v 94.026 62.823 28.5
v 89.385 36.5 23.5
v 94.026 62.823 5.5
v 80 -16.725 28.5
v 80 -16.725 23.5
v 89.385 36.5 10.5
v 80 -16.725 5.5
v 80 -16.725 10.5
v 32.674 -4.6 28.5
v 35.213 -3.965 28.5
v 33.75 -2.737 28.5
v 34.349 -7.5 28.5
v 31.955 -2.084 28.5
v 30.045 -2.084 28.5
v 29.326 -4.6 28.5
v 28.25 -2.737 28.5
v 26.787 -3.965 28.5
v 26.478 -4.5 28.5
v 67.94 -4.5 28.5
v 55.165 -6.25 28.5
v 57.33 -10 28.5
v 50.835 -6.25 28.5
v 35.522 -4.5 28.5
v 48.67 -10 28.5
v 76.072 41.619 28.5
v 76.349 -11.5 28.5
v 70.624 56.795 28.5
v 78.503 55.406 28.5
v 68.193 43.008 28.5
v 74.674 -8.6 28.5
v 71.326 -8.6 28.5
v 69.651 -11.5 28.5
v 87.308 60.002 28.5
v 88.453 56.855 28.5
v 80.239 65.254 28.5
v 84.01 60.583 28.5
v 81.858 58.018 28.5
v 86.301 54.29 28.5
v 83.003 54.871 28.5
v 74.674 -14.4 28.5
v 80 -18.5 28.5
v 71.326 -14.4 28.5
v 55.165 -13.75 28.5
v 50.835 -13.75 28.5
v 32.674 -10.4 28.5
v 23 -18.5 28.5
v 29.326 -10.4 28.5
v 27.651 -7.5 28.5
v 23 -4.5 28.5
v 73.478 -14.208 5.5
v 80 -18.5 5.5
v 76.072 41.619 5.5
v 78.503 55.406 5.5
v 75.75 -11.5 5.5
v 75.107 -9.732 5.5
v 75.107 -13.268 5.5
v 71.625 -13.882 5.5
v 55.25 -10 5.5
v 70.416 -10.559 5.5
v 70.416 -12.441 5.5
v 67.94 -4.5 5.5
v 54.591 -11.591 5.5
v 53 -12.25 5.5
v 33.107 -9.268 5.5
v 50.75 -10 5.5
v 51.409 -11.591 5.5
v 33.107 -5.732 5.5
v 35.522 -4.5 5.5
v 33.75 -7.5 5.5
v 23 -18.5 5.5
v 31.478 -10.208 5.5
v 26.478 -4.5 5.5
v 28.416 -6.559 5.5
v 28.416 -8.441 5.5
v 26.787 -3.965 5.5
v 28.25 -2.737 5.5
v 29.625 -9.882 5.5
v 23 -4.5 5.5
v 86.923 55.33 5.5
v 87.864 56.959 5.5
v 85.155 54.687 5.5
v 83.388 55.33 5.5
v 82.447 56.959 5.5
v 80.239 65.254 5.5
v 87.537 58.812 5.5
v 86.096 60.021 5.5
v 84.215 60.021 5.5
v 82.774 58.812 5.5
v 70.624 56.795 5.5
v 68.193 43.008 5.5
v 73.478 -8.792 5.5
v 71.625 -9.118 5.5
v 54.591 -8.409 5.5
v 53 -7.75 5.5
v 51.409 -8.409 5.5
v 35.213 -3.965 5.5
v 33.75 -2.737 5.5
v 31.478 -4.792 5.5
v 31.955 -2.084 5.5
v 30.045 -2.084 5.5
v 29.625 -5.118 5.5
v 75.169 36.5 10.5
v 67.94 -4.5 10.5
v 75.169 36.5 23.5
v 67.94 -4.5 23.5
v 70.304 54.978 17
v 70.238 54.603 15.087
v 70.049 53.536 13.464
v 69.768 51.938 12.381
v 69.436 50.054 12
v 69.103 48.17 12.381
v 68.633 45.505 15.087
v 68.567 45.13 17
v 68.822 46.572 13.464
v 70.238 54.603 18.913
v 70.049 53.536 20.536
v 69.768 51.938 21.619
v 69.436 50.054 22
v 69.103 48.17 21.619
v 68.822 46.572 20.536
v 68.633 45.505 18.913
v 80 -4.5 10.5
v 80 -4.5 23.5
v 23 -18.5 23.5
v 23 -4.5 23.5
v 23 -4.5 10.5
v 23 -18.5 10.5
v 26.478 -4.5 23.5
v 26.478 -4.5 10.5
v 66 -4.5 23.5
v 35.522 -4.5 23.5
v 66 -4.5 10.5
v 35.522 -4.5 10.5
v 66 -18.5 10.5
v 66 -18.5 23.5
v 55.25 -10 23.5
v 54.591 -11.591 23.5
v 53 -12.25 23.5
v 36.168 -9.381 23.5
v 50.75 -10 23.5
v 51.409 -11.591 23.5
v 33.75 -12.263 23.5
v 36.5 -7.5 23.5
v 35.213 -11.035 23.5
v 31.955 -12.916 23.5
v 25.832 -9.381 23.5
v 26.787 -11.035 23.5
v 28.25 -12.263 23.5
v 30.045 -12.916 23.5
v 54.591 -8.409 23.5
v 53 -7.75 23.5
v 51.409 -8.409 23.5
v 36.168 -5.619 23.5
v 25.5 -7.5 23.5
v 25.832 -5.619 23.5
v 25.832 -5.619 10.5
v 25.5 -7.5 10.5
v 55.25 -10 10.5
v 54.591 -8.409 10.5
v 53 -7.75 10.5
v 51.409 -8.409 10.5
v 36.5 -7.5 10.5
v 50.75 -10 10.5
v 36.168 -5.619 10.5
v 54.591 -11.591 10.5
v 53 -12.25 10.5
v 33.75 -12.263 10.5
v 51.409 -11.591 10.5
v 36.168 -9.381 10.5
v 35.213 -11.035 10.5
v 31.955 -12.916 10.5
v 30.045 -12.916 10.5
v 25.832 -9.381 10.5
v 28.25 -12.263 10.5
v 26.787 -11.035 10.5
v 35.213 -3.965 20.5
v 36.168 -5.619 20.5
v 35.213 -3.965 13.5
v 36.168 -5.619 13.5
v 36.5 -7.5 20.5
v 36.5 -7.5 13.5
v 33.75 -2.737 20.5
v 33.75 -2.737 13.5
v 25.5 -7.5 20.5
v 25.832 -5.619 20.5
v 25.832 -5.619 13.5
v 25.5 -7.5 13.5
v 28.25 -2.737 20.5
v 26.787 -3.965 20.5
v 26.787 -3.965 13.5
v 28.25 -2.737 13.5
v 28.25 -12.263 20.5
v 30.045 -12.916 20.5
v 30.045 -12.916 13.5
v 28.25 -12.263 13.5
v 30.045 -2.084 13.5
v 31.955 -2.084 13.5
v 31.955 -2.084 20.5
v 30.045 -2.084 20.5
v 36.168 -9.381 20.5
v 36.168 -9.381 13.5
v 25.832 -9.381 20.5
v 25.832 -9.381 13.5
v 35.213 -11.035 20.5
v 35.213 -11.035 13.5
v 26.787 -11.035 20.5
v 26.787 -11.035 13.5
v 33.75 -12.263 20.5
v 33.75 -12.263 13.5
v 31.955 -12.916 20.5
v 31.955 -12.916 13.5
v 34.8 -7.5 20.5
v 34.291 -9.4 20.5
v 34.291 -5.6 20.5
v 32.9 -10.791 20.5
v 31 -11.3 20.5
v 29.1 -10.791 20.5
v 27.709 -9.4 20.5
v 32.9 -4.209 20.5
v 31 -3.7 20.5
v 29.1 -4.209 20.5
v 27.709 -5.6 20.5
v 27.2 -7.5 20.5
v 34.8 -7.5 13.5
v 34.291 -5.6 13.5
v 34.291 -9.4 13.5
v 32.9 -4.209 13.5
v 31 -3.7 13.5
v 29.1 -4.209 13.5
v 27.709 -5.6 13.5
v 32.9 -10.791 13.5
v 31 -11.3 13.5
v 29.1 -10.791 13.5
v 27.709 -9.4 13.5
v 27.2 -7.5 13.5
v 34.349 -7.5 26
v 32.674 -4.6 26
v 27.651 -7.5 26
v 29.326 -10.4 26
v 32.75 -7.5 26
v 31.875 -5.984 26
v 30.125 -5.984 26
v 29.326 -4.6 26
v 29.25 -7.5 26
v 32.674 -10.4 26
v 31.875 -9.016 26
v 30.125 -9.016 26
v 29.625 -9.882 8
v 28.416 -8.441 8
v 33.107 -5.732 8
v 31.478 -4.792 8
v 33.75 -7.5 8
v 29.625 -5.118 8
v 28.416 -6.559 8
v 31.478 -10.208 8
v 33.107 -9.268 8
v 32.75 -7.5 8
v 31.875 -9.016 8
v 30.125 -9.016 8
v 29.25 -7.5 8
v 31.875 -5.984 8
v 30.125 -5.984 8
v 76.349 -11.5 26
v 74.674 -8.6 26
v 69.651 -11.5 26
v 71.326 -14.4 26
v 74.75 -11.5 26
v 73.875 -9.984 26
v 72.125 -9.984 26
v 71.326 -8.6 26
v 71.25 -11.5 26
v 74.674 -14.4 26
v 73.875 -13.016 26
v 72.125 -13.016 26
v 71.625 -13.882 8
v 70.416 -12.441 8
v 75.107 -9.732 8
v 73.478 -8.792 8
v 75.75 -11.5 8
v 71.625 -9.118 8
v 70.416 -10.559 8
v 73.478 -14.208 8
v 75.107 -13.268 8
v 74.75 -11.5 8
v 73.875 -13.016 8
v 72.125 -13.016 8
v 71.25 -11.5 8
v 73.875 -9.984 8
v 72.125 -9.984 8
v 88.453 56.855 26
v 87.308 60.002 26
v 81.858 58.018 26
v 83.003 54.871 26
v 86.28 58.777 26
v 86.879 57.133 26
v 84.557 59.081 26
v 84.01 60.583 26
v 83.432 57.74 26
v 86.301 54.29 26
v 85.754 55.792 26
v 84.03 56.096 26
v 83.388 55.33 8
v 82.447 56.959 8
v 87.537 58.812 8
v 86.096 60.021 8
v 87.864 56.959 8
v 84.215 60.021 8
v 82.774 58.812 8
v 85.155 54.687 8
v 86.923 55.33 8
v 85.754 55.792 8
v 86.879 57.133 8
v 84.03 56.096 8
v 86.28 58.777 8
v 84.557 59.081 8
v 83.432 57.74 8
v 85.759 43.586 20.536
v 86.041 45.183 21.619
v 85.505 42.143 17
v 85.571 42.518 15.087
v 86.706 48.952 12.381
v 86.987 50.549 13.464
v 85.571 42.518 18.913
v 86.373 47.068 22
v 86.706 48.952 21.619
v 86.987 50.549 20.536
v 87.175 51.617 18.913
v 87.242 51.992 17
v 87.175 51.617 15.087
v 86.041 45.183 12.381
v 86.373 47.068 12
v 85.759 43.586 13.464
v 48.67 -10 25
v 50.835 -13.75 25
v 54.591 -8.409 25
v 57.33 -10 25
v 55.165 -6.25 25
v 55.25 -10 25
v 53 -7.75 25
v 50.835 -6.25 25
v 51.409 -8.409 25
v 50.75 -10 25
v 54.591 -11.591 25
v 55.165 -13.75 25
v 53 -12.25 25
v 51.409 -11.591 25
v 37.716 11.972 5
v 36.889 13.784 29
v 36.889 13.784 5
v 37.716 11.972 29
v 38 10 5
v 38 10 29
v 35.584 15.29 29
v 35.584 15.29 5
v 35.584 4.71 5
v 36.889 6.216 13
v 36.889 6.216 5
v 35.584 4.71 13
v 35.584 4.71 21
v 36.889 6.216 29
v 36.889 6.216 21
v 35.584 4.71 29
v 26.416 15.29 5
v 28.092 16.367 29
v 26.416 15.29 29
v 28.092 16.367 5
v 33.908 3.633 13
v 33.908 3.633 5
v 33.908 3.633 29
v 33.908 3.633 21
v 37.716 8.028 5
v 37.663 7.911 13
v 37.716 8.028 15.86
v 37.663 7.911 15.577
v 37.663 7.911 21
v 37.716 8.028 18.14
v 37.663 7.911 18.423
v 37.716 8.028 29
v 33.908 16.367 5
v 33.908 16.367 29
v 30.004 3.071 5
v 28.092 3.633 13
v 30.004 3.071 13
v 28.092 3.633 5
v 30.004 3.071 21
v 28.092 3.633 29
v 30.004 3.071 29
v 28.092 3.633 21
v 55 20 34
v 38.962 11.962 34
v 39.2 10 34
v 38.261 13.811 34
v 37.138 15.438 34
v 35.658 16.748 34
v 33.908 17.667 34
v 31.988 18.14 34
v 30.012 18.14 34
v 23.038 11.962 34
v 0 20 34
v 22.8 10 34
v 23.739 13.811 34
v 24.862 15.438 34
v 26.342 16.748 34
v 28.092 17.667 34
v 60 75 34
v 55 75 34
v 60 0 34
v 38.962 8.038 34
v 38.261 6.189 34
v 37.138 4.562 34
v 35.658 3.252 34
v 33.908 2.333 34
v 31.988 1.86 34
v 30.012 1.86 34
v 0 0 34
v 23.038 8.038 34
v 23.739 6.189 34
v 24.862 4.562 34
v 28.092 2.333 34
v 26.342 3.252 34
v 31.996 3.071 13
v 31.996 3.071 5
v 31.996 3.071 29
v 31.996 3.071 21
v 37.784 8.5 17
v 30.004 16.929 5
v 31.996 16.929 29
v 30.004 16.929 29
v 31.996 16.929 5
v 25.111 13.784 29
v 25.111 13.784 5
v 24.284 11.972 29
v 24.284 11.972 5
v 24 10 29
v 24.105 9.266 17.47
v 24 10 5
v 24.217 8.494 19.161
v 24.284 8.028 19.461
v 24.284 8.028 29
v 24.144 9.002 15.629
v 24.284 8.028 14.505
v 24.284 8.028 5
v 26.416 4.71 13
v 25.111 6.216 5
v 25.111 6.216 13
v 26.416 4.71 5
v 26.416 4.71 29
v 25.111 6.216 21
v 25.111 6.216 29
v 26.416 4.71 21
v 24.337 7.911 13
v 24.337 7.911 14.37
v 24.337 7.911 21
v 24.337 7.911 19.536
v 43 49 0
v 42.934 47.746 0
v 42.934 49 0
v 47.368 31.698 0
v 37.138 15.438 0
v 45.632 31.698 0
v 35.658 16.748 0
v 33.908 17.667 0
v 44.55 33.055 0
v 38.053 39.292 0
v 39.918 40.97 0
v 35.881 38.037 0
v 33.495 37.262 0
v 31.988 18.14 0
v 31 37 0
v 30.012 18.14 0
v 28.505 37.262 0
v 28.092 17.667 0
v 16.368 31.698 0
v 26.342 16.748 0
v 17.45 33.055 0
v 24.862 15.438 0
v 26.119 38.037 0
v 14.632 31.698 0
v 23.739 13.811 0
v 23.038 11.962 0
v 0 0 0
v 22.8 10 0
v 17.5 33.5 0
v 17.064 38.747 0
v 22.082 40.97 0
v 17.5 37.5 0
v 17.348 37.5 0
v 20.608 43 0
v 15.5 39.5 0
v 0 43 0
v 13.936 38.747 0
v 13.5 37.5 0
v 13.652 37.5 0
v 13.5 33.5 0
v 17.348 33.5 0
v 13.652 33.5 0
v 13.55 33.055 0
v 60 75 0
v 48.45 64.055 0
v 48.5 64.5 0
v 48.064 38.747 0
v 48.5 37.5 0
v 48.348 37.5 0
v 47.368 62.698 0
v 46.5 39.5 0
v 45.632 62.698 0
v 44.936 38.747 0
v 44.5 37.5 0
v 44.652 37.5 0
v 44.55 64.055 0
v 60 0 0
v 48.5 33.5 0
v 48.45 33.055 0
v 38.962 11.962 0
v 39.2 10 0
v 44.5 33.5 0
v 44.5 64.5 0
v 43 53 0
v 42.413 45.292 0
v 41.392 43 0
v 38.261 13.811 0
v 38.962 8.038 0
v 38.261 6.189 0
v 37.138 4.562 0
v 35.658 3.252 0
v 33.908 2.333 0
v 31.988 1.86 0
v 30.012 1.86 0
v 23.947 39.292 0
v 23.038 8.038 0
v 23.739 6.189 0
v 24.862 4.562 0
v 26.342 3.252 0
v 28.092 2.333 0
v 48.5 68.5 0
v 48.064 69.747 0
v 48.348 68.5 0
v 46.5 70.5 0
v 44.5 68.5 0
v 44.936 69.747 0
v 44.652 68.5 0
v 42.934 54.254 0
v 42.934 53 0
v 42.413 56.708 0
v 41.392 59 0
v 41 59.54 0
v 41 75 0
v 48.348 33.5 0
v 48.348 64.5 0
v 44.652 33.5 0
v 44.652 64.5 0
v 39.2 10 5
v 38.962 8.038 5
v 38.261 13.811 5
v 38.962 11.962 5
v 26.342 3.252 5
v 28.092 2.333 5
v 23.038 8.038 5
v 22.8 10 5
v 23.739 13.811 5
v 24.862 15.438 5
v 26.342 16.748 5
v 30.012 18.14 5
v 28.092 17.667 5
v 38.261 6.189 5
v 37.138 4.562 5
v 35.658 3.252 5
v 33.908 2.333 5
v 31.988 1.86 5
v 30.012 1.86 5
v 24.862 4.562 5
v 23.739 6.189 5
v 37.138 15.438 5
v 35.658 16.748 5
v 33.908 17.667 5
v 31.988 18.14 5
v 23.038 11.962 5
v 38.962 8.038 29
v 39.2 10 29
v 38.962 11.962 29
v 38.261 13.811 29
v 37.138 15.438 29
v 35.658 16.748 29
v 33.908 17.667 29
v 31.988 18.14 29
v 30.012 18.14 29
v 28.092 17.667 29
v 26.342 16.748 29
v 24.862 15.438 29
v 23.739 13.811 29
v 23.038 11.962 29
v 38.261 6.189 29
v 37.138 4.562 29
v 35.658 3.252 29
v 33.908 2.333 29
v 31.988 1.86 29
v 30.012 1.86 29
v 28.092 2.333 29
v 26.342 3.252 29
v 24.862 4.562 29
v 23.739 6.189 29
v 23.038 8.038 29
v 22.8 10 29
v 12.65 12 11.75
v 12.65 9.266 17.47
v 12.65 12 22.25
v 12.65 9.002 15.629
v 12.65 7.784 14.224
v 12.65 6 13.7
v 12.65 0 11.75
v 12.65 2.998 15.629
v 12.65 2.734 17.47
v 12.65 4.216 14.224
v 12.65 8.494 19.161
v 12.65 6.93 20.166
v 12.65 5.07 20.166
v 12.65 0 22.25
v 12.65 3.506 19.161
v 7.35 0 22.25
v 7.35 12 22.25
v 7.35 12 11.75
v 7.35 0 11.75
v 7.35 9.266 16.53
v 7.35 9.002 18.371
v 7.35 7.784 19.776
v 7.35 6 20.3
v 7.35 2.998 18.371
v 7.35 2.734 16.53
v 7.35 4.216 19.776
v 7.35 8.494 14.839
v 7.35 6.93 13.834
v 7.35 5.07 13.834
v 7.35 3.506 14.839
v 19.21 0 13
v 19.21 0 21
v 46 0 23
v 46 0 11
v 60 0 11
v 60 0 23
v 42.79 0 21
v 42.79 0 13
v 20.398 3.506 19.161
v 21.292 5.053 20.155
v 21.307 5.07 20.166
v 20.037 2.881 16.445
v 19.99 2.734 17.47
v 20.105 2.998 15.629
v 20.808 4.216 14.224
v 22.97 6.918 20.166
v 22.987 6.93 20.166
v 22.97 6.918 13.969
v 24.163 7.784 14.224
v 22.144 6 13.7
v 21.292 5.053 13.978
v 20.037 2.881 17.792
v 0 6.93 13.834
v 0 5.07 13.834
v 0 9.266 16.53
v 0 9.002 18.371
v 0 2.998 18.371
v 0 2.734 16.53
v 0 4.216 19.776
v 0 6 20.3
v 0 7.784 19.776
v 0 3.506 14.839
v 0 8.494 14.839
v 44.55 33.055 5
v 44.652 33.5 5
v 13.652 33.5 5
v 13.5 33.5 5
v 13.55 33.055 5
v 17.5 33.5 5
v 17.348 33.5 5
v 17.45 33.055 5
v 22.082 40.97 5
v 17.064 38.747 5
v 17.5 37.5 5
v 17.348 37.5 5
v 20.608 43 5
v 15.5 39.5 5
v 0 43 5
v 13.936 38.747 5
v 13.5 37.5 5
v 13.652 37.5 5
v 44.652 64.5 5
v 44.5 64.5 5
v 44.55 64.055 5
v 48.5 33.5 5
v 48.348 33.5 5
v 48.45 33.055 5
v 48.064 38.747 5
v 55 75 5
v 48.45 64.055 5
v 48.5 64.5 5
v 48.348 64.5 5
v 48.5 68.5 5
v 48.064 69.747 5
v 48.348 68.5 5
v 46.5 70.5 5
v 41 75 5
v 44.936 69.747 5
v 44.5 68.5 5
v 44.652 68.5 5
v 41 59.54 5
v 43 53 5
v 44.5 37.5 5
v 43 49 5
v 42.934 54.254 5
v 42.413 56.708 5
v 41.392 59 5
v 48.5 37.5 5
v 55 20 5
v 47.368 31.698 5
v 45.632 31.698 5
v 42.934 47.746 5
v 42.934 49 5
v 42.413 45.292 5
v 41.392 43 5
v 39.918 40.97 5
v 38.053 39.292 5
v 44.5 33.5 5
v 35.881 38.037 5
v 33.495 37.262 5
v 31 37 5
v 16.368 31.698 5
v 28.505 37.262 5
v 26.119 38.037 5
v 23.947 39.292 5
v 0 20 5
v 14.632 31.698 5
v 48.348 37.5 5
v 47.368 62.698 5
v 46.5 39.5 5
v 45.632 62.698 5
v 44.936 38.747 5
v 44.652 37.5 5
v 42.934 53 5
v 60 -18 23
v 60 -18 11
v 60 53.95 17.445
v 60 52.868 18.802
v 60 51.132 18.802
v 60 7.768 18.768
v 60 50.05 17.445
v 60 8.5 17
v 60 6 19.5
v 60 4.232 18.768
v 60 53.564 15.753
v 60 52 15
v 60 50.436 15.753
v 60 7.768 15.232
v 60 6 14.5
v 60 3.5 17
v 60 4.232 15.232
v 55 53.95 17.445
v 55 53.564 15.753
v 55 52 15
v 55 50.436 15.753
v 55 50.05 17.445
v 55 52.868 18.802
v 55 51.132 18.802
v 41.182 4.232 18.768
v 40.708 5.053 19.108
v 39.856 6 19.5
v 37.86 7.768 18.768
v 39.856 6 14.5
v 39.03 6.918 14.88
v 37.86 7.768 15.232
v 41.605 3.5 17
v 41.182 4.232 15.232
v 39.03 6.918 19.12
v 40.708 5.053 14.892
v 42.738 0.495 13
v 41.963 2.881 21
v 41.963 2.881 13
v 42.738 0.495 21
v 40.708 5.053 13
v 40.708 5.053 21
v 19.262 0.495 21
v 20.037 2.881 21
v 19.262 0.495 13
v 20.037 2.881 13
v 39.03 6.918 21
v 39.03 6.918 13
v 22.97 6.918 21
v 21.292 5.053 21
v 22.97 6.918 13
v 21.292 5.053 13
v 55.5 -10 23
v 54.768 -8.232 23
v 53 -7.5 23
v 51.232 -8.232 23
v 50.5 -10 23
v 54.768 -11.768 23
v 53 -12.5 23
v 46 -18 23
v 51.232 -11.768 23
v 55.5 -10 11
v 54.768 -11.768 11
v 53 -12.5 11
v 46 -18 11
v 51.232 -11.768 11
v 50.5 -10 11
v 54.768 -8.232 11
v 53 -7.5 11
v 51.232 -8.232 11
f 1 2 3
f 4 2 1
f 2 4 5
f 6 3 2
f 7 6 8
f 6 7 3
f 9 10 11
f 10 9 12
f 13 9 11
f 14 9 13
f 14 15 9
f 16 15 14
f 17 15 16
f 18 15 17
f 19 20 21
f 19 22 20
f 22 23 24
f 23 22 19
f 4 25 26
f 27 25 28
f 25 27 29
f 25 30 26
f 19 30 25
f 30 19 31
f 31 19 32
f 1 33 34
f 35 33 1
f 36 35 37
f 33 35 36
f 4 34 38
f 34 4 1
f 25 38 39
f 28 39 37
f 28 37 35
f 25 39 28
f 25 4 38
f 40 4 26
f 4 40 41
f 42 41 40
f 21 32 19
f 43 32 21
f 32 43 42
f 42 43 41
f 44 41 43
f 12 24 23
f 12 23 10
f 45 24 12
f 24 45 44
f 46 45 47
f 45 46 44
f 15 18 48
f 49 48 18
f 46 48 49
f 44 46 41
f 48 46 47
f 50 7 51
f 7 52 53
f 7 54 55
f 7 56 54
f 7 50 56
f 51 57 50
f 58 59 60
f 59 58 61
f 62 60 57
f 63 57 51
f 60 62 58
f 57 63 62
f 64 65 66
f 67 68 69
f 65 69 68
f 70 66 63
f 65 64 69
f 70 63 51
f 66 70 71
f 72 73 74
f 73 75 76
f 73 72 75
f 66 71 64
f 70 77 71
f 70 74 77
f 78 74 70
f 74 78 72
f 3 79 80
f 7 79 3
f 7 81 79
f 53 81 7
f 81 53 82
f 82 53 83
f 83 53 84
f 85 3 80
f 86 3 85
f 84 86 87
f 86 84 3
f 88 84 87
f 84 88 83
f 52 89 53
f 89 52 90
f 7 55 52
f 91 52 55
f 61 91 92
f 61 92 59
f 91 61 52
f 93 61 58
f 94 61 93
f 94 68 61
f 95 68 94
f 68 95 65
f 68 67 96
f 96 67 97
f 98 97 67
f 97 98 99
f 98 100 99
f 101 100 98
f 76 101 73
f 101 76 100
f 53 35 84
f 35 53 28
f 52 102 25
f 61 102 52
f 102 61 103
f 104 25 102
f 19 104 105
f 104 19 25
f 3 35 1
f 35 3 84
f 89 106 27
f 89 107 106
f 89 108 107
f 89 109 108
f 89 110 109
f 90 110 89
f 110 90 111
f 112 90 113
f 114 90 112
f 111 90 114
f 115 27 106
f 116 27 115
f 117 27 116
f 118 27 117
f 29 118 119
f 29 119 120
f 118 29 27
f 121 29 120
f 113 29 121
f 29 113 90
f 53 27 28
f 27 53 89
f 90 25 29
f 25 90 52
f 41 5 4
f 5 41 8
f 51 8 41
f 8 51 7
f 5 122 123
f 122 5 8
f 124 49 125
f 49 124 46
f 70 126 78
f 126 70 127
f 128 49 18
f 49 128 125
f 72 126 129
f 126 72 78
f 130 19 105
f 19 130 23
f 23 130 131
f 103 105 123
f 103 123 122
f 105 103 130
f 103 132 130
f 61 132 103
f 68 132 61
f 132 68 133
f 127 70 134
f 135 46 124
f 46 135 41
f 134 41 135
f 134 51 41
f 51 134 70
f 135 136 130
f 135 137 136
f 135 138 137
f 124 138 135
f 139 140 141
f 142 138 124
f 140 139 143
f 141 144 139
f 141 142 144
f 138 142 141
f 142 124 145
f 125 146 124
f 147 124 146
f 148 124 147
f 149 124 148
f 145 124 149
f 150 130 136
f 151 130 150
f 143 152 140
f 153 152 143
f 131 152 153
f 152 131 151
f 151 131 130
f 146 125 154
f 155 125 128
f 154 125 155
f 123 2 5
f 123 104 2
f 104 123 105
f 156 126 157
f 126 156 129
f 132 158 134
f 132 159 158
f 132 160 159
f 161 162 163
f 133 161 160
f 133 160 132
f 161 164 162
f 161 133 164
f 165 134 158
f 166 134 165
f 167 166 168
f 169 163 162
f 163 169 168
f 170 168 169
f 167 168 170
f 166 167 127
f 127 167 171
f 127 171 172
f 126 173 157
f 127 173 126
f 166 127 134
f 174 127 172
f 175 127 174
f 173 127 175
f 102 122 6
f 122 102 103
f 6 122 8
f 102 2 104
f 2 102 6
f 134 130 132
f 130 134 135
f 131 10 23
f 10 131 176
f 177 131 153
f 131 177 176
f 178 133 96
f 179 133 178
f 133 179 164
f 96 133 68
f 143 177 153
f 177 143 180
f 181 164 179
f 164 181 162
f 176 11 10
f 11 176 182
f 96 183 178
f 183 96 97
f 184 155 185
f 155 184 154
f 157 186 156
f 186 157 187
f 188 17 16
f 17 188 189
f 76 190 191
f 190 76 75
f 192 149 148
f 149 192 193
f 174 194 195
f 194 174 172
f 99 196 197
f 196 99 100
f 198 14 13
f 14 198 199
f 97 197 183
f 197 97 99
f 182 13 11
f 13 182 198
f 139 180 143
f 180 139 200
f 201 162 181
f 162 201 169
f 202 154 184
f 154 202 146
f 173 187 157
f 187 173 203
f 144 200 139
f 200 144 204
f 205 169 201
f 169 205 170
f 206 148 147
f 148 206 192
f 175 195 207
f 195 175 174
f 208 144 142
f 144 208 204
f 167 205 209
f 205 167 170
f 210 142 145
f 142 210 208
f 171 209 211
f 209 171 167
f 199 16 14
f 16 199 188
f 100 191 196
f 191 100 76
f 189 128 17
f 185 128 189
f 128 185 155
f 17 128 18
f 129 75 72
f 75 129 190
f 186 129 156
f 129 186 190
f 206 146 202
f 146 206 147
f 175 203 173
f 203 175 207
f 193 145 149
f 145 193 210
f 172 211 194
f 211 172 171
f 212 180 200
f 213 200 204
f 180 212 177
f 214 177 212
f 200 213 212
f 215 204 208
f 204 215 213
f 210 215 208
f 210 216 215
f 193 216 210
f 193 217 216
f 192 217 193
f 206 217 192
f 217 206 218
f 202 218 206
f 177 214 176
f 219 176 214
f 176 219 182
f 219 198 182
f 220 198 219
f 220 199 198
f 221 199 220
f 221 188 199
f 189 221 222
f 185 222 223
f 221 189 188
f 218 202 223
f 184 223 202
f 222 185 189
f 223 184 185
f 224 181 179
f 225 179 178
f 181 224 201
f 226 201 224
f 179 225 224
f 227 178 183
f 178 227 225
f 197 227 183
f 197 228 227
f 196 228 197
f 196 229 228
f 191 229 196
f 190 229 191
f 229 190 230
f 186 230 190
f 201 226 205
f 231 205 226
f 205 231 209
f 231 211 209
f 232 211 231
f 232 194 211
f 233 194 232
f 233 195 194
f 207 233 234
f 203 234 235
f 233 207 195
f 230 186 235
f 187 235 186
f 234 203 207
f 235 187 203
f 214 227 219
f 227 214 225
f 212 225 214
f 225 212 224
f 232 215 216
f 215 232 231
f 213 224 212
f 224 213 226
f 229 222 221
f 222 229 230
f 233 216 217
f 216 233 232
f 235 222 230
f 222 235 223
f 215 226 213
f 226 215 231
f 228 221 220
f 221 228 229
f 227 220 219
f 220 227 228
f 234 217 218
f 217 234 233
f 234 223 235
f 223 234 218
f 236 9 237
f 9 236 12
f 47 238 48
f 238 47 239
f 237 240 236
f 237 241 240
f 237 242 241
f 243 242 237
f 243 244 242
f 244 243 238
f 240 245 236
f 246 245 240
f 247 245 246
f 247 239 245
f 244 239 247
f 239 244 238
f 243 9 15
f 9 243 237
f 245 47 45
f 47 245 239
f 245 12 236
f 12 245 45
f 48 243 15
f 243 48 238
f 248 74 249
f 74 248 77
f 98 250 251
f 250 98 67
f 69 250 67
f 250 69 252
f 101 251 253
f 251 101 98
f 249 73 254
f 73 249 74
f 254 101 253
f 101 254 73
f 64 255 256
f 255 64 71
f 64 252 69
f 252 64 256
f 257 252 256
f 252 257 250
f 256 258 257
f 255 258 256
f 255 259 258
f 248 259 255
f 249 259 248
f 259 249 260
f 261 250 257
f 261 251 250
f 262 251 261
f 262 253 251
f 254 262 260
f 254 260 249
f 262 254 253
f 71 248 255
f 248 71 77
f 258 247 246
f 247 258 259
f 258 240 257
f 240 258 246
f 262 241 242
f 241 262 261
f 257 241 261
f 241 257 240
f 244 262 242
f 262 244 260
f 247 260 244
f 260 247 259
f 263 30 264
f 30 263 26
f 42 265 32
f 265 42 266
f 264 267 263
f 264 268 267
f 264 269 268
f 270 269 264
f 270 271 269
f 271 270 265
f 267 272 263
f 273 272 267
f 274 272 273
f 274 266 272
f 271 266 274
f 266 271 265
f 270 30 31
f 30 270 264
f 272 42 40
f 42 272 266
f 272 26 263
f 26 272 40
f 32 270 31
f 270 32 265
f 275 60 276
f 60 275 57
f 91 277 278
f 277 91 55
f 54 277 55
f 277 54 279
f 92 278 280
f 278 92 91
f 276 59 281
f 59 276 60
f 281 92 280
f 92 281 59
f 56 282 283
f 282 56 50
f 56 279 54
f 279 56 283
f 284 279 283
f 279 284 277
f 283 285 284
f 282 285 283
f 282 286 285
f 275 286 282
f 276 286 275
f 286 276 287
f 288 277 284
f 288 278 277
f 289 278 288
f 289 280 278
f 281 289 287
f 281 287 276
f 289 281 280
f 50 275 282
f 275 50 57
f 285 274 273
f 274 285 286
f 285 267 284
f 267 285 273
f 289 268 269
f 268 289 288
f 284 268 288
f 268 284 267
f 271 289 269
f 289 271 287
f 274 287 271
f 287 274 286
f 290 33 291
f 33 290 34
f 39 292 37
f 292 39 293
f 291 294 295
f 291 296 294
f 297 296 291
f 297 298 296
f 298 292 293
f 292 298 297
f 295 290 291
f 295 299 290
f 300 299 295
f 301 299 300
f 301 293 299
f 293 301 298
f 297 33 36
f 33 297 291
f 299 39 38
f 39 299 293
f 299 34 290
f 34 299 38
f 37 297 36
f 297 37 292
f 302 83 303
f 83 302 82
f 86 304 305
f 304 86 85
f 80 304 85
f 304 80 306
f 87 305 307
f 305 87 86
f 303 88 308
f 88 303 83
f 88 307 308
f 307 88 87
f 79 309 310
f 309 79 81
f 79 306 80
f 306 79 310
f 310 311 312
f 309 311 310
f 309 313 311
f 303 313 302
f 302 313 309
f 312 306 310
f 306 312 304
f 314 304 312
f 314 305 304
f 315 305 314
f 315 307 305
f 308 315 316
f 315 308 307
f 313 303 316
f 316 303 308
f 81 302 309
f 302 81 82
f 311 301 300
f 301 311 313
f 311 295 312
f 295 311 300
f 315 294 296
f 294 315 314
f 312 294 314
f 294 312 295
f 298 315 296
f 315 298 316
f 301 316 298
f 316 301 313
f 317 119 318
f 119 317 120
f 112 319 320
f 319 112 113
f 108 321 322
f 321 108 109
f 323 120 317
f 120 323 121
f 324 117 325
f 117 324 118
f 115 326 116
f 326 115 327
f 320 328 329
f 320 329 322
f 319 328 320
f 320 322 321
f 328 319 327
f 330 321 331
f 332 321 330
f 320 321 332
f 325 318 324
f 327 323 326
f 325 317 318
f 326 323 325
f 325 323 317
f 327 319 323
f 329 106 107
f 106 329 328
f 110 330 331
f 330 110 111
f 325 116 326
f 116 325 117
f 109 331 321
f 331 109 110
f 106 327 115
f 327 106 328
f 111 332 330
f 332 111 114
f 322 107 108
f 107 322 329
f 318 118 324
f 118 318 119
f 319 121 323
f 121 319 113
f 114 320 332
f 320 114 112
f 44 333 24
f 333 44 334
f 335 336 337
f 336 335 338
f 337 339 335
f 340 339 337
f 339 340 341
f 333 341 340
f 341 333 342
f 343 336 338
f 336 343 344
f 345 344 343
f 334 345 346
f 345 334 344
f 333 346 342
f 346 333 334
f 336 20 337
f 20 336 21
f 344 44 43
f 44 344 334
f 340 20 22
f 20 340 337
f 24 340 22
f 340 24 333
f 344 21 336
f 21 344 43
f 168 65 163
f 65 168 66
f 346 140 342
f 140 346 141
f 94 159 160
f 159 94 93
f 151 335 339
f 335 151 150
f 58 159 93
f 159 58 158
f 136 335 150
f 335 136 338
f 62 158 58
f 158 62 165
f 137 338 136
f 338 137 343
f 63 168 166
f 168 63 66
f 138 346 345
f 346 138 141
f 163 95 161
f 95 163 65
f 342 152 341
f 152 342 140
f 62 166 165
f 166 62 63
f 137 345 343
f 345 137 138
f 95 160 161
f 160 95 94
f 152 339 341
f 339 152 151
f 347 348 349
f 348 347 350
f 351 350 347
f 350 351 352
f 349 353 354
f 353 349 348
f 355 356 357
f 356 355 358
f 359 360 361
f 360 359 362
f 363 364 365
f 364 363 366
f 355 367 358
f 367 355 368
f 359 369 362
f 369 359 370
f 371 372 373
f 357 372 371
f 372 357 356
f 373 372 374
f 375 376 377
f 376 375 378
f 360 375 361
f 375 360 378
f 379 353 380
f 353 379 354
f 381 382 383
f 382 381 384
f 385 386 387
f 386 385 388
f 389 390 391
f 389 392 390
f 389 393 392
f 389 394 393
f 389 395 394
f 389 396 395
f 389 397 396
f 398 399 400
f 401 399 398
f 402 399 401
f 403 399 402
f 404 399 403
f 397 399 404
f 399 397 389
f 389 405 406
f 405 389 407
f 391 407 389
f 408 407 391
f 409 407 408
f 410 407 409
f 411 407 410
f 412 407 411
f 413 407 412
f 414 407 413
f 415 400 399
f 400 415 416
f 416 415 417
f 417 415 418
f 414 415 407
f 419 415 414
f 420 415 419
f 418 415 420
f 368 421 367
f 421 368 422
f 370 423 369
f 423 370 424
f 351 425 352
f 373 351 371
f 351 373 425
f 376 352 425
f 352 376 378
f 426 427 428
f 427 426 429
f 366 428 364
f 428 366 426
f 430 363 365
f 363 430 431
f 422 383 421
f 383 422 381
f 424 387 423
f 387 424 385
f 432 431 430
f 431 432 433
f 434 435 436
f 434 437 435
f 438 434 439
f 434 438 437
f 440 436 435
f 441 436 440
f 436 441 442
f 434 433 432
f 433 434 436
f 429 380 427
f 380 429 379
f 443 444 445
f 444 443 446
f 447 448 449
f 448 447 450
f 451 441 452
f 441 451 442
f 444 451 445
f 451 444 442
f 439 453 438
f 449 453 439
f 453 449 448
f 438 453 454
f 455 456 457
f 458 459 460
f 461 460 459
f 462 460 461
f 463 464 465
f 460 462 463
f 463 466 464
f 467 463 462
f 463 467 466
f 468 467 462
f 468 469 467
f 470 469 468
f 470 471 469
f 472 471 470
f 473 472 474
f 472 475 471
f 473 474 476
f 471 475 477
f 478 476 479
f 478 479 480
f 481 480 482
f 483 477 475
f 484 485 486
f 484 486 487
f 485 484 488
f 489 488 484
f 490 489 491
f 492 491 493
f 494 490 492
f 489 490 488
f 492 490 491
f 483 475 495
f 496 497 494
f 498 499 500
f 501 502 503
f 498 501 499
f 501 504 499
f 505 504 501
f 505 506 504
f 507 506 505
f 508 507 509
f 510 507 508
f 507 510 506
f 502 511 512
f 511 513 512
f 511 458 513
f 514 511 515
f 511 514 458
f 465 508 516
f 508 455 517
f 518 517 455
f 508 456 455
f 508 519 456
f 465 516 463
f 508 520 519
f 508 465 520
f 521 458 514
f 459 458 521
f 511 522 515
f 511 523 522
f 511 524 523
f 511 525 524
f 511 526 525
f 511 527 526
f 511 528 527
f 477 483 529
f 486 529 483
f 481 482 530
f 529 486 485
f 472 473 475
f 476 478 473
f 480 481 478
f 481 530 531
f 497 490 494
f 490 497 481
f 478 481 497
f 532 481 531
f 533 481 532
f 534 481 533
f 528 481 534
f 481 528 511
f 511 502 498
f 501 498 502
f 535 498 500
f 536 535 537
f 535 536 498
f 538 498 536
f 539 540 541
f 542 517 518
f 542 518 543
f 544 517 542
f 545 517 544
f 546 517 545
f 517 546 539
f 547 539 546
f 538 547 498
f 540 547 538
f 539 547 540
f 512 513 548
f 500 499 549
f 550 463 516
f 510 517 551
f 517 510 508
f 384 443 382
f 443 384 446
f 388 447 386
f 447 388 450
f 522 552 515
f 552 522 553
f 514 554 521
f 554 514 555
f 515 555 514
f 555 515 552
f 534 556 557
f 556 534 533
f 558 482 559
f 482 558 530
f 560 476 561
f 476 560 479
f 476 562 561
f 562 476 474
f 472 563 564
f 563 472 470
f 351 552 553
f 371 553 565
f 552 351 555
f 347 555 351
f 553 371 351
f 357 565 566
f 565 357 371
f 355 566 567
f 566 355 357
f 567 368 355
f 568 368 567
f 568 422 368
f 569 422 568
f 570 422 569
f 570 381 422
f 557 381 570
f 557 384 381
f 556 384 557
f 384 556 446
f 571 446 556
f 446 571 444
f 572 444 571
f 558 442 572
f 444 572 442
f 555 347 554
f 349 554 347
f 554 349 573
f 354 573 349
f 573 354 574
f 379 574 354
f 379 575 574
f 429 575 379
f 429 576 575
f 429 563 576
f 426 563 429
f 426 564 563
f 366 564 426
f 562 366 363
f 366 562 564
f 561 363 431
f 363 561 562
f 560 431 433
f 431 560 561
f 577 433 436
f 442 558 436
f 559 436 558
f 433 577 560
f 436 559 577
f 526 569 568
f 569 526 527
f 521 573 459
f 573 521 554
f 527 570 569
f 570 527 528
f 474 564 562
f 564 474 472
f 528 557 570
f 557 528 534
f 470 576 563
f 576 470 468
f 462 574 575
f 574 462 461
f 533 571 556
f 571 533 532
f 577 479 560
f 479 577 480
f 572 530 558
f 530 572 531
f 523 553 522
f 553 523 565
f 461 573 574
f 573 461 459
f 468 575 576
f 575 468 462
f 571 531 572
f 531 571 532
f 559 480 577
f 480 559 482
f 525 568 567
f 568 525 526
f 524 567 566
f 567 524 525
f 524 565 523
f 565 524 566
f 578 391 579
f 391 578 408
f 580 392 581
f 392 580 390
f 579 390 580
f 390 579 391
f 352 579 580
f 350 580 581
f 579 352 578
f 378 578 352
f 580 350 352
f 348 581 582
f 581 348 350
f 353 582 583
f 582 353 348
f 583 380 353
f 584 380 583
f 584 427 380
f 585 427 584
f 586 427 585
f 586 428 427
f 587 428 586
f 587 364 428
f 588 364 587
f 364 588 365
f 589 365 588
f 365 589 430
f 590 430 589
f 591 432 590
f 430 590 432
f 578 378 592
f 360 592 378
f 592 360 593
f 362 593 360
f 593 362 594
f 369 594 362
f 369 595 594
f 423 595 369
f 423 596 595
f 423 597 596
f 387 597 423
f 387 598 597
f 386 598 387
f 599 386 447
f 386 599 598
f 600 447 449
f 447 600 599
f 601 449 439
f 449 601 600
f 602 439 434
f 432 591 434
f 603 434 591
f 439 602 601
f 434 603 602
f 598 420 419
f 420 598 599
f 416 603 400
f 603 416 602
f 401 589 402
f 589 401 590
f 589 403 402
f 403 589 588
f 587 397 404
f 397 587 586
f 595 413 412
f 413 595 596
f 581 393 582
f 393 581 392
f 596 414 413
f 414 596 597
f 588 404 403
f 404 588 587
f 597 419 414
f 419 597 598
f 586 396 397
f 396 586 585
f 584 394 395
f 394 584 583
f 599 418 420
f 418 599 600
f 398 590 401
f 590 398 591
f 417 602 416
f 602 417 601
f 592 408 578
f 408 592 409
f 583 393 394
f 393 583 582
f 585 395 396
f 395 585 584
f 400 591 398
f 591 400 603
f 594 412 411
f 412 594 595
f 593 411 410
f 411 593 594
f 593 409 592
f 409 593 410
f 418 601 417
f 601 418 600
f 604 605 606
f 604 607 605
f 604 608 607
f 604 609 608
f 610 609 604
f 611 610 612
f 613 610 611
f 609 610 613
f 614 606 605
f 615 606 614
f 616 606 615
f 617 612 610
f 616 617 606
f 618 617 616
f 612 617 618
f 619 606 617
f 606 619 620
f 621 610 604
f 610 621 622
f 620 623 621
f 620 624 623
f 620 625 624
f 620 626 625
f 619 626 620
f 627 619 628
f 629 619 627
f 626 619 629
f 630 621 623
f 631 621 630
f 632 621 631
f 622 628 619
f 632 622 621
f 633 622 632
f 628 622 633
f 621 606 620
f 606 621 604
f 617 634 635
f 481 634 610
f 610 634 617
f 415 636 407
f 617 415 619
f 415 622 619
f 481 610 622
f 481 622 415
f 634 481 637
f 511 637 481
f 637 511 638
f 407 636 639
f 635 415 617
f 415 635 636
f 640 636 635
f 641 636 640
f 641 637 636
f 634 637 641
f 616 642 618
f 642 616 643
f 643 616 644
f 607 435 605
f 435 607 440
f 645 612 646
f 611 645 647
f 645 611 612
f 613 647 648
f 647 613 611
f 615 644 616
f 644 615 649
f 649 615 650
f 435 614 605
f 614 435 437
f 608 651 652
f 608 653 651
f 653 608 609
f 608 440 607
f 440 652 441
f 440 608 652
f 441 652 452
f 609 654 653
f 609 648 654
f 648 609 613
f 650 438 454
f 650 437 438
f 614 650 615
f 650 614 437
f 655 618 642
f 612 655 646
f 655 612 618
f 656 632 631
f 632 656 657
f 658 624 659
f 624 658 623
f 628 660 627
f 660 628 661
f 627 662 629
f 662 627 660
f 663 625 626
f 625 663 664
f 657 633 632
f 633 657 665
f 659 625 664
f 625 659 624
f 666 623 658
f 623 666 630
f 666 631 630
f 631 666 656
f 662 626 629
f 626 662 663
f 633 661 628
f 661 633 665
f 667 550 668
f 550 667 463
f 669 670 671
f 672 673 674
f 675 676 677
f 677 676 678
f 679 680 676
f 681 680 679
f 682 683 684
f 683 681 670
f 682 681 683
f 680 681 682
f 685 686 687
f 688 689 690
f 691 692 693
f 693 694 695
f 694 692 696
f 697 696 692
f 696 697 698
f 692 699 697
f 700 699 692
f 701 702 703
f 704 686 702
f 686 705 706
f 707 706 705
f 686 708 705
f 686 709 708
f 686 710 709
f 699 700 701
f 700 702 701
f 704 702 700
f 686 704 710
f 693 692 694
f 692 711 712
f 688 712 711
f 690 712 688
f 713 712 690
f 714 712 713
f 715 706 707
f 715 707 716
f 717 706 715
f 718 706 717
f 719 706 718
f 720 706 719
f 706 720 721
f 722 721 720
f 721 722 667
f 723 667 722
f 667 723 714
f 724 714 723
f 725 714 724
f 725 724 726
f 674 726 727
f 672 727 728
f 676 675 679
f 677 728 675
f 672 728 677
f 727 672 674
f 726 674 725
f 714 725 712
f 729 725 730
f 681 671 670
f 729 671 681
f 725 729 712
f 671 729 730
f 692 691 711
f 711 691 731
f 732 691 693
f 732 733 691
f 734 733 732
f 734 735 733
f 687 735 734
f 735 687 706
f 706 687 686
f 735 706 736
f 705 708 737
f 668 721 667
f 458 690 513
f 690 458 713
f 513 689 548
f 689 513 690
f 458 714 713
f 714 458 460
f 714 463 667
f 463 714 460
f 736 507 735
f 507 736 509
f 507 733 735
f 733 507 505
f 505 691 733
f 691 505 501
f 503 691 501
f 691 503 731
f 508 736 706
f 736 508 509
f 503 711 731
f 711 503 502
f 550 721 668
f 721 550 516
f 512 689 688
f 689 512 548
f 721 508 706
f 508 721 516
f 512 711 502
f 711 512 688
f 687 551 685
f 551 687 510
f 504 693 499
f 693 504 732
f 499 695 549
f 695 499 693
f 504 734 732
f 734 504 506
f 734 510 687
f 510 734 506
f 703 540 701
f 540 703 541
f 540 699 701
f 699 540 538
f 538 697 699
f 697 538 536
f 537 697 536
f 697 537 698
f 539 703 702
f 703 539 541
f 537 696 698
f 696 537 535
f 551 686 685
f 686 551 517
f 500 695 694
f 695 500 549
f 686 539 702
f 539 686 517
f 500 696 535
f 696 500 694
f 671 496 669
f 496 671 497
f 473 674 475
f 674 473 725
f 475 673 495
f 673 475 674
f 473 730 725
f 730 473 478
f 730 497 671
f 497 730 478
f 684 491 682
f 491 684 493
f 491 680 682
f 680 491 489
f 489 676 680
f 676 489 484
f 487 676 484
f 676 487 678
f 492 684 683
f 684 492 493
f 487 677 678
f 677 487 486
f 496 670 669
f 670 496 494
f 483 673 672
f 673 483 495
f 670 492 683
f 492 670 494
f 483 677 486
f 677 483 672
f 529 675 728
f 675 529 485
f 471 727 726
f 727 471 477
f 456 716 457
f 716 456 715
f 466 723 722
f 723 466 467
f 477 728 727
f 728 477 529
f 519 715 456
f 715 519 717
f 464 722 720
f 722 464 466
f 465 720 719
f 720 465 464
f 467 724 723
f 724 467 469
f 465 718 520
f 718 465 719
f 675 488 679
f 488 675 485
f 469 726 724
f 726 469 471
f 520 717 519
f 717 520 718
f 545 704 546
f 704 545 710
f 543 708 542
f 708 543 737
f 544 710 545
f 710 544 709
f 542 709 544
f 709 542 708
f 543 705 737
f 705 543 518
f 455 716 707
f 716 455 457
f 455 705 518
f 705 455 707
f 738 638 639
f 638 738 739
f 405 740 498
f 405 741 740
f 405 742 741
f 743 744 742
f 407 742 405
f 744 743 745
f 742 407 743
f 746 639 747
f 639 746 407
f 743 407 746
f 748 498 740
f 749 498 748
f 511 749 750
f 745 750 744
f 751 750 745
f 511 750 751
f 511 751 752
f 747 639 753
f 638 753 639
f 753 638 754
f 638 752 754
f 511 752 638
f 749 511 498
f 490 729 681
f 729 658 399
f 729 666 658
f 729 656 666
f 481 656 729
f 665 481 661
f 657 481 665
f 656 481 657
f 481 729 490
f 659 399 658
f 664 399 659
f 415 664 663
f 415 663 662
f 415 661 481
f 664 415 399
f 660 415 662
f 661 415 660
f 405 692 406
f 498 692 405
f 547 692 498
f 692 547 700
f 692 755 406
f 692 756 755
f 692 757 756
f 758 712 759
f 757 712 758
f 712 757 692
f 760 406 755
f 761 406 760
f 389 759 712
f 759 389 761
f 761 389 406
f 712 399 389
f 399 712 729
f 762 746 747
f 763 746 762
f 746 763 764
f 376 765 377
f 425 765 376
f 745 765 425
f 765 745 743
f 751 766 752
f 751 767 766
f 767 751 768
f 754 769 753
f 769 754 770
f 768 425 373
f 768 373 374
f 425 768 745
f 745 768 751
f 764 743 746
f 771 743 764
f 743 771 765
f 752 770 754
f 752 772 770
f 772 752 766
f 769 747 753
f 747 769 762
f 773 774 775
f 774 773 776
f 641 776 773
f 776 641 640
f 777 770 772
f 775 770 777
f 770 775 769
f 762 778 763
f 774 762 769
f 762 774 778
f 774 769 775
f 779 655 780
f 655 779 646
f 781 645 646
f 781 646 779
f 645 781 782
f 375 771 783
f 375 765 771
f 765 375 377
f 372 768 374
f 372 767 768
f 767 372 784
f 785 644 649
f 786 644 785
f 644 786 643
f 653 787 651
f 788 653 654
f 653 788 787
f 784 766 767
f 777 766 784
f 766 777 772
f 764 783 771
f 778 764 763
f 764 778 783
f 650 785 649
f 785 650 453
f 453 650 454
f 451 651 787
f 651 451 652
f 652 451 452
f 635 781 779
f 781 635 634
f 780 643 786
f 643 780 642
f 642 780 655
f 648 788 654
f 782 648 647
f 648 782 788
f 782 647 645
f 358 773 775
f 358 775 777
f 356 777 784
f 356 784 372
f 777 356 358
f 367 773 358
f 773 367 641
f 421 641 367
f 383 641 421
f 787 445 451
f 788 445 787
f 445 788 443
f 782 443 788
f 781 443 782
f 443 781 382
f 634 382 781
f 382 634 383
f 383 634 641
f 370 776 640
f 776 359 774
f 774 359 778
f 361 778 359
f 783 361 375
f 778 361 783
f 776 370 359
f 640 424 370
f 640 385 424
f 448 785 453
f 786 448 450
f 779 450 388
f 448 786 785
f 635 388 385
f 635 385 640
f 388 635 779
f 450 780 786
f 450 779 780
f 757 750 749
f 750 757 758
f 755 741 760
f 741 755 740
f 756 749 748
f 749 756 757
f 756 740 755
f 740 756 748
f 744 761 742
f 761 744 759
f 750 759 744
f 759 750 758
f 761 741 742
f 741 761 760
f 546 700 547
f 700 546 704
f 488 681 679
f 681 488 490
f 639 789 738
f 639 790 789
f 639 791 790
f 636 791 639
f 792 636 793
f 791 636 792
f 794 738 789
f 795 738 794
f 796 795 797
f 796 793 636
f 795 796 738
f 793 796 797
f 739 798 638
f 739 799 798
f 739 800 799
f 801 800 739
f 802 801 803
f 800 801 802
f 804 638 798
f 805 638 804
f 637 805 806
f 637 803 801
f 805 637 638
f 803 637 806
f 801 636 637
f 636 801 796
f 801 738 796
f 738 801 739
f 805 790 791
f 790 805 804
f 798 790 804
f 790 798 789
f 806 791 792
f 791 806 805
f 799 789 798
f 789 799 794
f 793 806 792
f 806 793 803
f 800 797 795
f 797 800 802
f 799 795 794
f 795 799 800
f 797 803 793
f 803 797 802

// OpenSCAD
// file: util.scad
/* Tête de vis six pans
	d = distance plat à plat opposé. 
 	h = épaisseur de l'écrou 
*/
module sixpans(d, h) {

	for(i=[0:60:120]) 
	rotate(i+30, [0,0,1]) cube([d,d*tan(30),h], true);
}

/* Ovale plat (pour trous coulissants)
	d = diamètre du trou
   l = longueur du trou 
	h = épaisseur du trou
*/
module ovale(d, l, h) {
	translate([-(l-d)/2,0,0]) cylinder(h, d/2, d/2, true);
	translate([(l-d)/2,0,0])	cylinder(h, d/2, d/2, true);
	cube([l-d,d,h],true);
}

/* Trous pour un moteur Nama 17
	h = épaisseur des trous
	j = jeu de glissement
*/
module nema17(h, j) {
	translate([-15.5,-15.5,0]) ovale(4, 4 + j, h);
	translate([ 15.5,-15.5,0]) ovale(4, 4 + j, h);
	translate([-15.5, 15.5,0]) ovale(4, 4 + j, h);
	translate([ 15.5, 15.5,0]) ovale(4, 4 + j, h);
	ovale(24, 24 + j, h);
}

/* Vis six pans
	de = distance plat à plat opposé de la tête
 	he = épaisseur de la tête
	dv = diamètre de la vis
	l = longueur totale de la vis
*/
module vissixpans(de, he, dv, l) {
	translate([0,0,he/2]) sixpans(de, he);
	cylinder(l, dv/2,dv/2);
}

/* vis à tete cylindrique et son écrou six pans
	m = metric 3 = M3, 4 = M4, etc.
	h = longueur totale de la vis
*/
module vis_noyee(m, h) {
	if(m==3) {
		cylinder(2.5, 5.5/2, 5.5/2);
		cylinder(h, 3.5/2, 3.5/2);
		translate([0,0,h-2.5/2]) sixpans(5.8, 2.5);
	}
	else if(m==4) {
		cylinder(3, 4.5/2, 4.5/2);
		cylinder(h, 4.5/2, 4.5/2);
		translate([0,0,h-3.5/2]) sixpans(7.5, 3.5);
	}
	else if(m==5) {
		cylinder(4.5, 10.5/2, 10.5/2);
		cylinder(h, 5.5/2, 5.5/2);
		translate([0,0,h-4.5/2]) sixpans(8.5, 4.5);

	}
}

//vissixpans(6, 3, 3, 20);
// nema17(5, 4);
//ovale(5, 10, 3);
//sixpans(8, 3);
// main file
include <util.scad>;

//$fa = 1;
//$fs = 1;

sx = 60;
sy = 75;
sz = 34;

my = 20;
mx = 5;
mz = 5;

/* passage de la grosse visse */
ax = 31;
ay = my/2;

/* passage du filament */
fy = ay - 4;
fz = sz / 2;
fr = 2.5;

/* pression */
px = 50;
py = 75;
pz = sz - 10 - 1;
pe1 = 14;
pe2 = 14;
pinz = pz - 2 * 5;
pdy = 4;

raccord_y = 10; // position de la fixation entre le socle et la pression

entre_axes = 41; // axe moteur et axe grosse vis
entre_axes_2 = 4 - 0.5 + 3 + 11; // axe grosse vis et axe roulement de pression


module meca() {
	color("Black", 0.5) {
		cylinder(12, 32, 32);		
		cylinder(62, 4, 4);		
		translate([0, entre_axes, 0]) {
			cylinder(12, 10, 10);
			translate([0, 0, 10]) cylinder(10, 7.5, 7.5);		
			translate([0, 0, 20+47/2]) cube([42,42,47], true);
		}
		translate([0, -entre_axes_2, 20 + fz - mz]) {
			cylinder(7, 11, 11, true);
			cylinder(15, 3.9, 3.9, true);
		}
	}
}

module pression() {
	difference() {
		union() {
			translate([-43,-pdy,-pz/2]) {
				translate([35, 0,0]) {
					difference() {
						union() {
							translate([0,-pe2/2,0]) cube([px+pe1/2,pe2,pz]);	
							translate([px-pe1/2,-pe2/2+3,0]) rotate(-10,[0,0,1]) {
								cube([pe1,py+pe2/2,pz]);	
								translate([0,py-10,pz/2]) cube([16,pe2,pz],true); 
							}
						}
						translate([0,-pe2/2,(pz-pinz)/2]) cube([px+20,py-20,pinz]);
					}
				}
				translate([35 + px,0,pz/2]) cube([pe1,pe2,pz],true); 
				// cylinder(pz,10,10);		
			}
			cylinder(pz, 3.8, 3.8, true);
			difference() {
				cylinder(pz, 5.5, 5.5, true);
				// translate([-15/2,pe2/2-pdy,-15/2]) cube([15,25,15]);
				cube([15,15,7], true);
			}
		}
		//# cylinder(pz-2*3, 4, 4, true);
		translate([0,0,-pz/2]) {
			translate([0,0,0]) vis_noyee(3, pz);
			translate([-43+px+35,-pdy,0]) {
				vis_noyee(3, pz);
				rotate(-10,[0,0,1]) translate([0,py-5,0]) {
					vis_noyee(3, pz);
					translate([3,-10,pz/2]) rotate(-90,[0,1,0]) cylinder(30,5,5);
				}
			}
			translate([-ax+sx-7,entre_axes_2-ay-raccord_y,0]) vis_noyee(4, pz);
		}

	}
}

module fixation(l) {
	translate([-13, 8, 0]) vissixpans(7, 5, 4.5, l);
	translate([-13,-8, 0]) vissixpans(7, 5, 4.5, l);
	translate([ 13,-8, 0]) vissixpans(7, 5, 4.5, l);
	translate([ 13, 8, 0]) vissixpans(7, 5, 4.5, l);
}

module fixtube(b1, b2, tr) {
	translate([-5.3/2, -fy,  -10.5/2]) {
		cube([5.3, fy + 6, 10.5]);
	}
	// translate([-b1,-fy,-tr]) cube([b1,fy,tr*2]);
	// translate([5.3/2,-fy,-tr]) cube([5,fy,tr*2]);
	rotate(90, [0,1,0]) cylinder(b2 + 5.3/2, tr, tr);
	rotate(270, [0,1,0]) cylinder(b1, tr, tr);
}

//translate([ax,ay,-20+mz]) meca();
translate([ax,-entre_axes_2+ay,fz]) pression();

difference() {
	cube([sx,sy,sz]);
	translate([0,my,mz]) {
		cube([sx-mx,sy-my,sz-mz]);
	}
	translate([ax,ay,0]) {
		cylinder(sz, 7, 7);
		cylinder(5, 8.2, 8.2);
		translate([0,0,sz-5]) cylinder(5, 8.2, 8.2);
	}
	//// translate([ax,my+0.1,sz/2]) rotate(90,[1,0,0]) fixation(my+0.2);
	translate([0,fy,fz]) rotate(90,[0,1,0]) cylinder(sx, fr, fr); // filament
	translate([ax,fy - 8,fz]) cylinder(8, 12, 12, true);
	translate([10, fy, fz]) fixtube(11, 12, 3.3);
 	translate([ax,ay + entre_axes,mz/2]) rotate(90, [0,0,1]) nema17(mz, 4);
	translate([sx-mx,52,sz/2]) # rotate(90,[0,1,0]) cylinder(mx,2,2);
	translate([0,43,0]) cube([41,sy-43,mz]);
}

translate([0,0,sz/2]) {
	difference() {
		translate([sx-14/2,-18/2,0]) cube([14,18,pinz-1],true);
		translate([sx-14/2,-raccord_y,0]) cylinder(pinz-1,2.5,2.5, true);
	}
}
